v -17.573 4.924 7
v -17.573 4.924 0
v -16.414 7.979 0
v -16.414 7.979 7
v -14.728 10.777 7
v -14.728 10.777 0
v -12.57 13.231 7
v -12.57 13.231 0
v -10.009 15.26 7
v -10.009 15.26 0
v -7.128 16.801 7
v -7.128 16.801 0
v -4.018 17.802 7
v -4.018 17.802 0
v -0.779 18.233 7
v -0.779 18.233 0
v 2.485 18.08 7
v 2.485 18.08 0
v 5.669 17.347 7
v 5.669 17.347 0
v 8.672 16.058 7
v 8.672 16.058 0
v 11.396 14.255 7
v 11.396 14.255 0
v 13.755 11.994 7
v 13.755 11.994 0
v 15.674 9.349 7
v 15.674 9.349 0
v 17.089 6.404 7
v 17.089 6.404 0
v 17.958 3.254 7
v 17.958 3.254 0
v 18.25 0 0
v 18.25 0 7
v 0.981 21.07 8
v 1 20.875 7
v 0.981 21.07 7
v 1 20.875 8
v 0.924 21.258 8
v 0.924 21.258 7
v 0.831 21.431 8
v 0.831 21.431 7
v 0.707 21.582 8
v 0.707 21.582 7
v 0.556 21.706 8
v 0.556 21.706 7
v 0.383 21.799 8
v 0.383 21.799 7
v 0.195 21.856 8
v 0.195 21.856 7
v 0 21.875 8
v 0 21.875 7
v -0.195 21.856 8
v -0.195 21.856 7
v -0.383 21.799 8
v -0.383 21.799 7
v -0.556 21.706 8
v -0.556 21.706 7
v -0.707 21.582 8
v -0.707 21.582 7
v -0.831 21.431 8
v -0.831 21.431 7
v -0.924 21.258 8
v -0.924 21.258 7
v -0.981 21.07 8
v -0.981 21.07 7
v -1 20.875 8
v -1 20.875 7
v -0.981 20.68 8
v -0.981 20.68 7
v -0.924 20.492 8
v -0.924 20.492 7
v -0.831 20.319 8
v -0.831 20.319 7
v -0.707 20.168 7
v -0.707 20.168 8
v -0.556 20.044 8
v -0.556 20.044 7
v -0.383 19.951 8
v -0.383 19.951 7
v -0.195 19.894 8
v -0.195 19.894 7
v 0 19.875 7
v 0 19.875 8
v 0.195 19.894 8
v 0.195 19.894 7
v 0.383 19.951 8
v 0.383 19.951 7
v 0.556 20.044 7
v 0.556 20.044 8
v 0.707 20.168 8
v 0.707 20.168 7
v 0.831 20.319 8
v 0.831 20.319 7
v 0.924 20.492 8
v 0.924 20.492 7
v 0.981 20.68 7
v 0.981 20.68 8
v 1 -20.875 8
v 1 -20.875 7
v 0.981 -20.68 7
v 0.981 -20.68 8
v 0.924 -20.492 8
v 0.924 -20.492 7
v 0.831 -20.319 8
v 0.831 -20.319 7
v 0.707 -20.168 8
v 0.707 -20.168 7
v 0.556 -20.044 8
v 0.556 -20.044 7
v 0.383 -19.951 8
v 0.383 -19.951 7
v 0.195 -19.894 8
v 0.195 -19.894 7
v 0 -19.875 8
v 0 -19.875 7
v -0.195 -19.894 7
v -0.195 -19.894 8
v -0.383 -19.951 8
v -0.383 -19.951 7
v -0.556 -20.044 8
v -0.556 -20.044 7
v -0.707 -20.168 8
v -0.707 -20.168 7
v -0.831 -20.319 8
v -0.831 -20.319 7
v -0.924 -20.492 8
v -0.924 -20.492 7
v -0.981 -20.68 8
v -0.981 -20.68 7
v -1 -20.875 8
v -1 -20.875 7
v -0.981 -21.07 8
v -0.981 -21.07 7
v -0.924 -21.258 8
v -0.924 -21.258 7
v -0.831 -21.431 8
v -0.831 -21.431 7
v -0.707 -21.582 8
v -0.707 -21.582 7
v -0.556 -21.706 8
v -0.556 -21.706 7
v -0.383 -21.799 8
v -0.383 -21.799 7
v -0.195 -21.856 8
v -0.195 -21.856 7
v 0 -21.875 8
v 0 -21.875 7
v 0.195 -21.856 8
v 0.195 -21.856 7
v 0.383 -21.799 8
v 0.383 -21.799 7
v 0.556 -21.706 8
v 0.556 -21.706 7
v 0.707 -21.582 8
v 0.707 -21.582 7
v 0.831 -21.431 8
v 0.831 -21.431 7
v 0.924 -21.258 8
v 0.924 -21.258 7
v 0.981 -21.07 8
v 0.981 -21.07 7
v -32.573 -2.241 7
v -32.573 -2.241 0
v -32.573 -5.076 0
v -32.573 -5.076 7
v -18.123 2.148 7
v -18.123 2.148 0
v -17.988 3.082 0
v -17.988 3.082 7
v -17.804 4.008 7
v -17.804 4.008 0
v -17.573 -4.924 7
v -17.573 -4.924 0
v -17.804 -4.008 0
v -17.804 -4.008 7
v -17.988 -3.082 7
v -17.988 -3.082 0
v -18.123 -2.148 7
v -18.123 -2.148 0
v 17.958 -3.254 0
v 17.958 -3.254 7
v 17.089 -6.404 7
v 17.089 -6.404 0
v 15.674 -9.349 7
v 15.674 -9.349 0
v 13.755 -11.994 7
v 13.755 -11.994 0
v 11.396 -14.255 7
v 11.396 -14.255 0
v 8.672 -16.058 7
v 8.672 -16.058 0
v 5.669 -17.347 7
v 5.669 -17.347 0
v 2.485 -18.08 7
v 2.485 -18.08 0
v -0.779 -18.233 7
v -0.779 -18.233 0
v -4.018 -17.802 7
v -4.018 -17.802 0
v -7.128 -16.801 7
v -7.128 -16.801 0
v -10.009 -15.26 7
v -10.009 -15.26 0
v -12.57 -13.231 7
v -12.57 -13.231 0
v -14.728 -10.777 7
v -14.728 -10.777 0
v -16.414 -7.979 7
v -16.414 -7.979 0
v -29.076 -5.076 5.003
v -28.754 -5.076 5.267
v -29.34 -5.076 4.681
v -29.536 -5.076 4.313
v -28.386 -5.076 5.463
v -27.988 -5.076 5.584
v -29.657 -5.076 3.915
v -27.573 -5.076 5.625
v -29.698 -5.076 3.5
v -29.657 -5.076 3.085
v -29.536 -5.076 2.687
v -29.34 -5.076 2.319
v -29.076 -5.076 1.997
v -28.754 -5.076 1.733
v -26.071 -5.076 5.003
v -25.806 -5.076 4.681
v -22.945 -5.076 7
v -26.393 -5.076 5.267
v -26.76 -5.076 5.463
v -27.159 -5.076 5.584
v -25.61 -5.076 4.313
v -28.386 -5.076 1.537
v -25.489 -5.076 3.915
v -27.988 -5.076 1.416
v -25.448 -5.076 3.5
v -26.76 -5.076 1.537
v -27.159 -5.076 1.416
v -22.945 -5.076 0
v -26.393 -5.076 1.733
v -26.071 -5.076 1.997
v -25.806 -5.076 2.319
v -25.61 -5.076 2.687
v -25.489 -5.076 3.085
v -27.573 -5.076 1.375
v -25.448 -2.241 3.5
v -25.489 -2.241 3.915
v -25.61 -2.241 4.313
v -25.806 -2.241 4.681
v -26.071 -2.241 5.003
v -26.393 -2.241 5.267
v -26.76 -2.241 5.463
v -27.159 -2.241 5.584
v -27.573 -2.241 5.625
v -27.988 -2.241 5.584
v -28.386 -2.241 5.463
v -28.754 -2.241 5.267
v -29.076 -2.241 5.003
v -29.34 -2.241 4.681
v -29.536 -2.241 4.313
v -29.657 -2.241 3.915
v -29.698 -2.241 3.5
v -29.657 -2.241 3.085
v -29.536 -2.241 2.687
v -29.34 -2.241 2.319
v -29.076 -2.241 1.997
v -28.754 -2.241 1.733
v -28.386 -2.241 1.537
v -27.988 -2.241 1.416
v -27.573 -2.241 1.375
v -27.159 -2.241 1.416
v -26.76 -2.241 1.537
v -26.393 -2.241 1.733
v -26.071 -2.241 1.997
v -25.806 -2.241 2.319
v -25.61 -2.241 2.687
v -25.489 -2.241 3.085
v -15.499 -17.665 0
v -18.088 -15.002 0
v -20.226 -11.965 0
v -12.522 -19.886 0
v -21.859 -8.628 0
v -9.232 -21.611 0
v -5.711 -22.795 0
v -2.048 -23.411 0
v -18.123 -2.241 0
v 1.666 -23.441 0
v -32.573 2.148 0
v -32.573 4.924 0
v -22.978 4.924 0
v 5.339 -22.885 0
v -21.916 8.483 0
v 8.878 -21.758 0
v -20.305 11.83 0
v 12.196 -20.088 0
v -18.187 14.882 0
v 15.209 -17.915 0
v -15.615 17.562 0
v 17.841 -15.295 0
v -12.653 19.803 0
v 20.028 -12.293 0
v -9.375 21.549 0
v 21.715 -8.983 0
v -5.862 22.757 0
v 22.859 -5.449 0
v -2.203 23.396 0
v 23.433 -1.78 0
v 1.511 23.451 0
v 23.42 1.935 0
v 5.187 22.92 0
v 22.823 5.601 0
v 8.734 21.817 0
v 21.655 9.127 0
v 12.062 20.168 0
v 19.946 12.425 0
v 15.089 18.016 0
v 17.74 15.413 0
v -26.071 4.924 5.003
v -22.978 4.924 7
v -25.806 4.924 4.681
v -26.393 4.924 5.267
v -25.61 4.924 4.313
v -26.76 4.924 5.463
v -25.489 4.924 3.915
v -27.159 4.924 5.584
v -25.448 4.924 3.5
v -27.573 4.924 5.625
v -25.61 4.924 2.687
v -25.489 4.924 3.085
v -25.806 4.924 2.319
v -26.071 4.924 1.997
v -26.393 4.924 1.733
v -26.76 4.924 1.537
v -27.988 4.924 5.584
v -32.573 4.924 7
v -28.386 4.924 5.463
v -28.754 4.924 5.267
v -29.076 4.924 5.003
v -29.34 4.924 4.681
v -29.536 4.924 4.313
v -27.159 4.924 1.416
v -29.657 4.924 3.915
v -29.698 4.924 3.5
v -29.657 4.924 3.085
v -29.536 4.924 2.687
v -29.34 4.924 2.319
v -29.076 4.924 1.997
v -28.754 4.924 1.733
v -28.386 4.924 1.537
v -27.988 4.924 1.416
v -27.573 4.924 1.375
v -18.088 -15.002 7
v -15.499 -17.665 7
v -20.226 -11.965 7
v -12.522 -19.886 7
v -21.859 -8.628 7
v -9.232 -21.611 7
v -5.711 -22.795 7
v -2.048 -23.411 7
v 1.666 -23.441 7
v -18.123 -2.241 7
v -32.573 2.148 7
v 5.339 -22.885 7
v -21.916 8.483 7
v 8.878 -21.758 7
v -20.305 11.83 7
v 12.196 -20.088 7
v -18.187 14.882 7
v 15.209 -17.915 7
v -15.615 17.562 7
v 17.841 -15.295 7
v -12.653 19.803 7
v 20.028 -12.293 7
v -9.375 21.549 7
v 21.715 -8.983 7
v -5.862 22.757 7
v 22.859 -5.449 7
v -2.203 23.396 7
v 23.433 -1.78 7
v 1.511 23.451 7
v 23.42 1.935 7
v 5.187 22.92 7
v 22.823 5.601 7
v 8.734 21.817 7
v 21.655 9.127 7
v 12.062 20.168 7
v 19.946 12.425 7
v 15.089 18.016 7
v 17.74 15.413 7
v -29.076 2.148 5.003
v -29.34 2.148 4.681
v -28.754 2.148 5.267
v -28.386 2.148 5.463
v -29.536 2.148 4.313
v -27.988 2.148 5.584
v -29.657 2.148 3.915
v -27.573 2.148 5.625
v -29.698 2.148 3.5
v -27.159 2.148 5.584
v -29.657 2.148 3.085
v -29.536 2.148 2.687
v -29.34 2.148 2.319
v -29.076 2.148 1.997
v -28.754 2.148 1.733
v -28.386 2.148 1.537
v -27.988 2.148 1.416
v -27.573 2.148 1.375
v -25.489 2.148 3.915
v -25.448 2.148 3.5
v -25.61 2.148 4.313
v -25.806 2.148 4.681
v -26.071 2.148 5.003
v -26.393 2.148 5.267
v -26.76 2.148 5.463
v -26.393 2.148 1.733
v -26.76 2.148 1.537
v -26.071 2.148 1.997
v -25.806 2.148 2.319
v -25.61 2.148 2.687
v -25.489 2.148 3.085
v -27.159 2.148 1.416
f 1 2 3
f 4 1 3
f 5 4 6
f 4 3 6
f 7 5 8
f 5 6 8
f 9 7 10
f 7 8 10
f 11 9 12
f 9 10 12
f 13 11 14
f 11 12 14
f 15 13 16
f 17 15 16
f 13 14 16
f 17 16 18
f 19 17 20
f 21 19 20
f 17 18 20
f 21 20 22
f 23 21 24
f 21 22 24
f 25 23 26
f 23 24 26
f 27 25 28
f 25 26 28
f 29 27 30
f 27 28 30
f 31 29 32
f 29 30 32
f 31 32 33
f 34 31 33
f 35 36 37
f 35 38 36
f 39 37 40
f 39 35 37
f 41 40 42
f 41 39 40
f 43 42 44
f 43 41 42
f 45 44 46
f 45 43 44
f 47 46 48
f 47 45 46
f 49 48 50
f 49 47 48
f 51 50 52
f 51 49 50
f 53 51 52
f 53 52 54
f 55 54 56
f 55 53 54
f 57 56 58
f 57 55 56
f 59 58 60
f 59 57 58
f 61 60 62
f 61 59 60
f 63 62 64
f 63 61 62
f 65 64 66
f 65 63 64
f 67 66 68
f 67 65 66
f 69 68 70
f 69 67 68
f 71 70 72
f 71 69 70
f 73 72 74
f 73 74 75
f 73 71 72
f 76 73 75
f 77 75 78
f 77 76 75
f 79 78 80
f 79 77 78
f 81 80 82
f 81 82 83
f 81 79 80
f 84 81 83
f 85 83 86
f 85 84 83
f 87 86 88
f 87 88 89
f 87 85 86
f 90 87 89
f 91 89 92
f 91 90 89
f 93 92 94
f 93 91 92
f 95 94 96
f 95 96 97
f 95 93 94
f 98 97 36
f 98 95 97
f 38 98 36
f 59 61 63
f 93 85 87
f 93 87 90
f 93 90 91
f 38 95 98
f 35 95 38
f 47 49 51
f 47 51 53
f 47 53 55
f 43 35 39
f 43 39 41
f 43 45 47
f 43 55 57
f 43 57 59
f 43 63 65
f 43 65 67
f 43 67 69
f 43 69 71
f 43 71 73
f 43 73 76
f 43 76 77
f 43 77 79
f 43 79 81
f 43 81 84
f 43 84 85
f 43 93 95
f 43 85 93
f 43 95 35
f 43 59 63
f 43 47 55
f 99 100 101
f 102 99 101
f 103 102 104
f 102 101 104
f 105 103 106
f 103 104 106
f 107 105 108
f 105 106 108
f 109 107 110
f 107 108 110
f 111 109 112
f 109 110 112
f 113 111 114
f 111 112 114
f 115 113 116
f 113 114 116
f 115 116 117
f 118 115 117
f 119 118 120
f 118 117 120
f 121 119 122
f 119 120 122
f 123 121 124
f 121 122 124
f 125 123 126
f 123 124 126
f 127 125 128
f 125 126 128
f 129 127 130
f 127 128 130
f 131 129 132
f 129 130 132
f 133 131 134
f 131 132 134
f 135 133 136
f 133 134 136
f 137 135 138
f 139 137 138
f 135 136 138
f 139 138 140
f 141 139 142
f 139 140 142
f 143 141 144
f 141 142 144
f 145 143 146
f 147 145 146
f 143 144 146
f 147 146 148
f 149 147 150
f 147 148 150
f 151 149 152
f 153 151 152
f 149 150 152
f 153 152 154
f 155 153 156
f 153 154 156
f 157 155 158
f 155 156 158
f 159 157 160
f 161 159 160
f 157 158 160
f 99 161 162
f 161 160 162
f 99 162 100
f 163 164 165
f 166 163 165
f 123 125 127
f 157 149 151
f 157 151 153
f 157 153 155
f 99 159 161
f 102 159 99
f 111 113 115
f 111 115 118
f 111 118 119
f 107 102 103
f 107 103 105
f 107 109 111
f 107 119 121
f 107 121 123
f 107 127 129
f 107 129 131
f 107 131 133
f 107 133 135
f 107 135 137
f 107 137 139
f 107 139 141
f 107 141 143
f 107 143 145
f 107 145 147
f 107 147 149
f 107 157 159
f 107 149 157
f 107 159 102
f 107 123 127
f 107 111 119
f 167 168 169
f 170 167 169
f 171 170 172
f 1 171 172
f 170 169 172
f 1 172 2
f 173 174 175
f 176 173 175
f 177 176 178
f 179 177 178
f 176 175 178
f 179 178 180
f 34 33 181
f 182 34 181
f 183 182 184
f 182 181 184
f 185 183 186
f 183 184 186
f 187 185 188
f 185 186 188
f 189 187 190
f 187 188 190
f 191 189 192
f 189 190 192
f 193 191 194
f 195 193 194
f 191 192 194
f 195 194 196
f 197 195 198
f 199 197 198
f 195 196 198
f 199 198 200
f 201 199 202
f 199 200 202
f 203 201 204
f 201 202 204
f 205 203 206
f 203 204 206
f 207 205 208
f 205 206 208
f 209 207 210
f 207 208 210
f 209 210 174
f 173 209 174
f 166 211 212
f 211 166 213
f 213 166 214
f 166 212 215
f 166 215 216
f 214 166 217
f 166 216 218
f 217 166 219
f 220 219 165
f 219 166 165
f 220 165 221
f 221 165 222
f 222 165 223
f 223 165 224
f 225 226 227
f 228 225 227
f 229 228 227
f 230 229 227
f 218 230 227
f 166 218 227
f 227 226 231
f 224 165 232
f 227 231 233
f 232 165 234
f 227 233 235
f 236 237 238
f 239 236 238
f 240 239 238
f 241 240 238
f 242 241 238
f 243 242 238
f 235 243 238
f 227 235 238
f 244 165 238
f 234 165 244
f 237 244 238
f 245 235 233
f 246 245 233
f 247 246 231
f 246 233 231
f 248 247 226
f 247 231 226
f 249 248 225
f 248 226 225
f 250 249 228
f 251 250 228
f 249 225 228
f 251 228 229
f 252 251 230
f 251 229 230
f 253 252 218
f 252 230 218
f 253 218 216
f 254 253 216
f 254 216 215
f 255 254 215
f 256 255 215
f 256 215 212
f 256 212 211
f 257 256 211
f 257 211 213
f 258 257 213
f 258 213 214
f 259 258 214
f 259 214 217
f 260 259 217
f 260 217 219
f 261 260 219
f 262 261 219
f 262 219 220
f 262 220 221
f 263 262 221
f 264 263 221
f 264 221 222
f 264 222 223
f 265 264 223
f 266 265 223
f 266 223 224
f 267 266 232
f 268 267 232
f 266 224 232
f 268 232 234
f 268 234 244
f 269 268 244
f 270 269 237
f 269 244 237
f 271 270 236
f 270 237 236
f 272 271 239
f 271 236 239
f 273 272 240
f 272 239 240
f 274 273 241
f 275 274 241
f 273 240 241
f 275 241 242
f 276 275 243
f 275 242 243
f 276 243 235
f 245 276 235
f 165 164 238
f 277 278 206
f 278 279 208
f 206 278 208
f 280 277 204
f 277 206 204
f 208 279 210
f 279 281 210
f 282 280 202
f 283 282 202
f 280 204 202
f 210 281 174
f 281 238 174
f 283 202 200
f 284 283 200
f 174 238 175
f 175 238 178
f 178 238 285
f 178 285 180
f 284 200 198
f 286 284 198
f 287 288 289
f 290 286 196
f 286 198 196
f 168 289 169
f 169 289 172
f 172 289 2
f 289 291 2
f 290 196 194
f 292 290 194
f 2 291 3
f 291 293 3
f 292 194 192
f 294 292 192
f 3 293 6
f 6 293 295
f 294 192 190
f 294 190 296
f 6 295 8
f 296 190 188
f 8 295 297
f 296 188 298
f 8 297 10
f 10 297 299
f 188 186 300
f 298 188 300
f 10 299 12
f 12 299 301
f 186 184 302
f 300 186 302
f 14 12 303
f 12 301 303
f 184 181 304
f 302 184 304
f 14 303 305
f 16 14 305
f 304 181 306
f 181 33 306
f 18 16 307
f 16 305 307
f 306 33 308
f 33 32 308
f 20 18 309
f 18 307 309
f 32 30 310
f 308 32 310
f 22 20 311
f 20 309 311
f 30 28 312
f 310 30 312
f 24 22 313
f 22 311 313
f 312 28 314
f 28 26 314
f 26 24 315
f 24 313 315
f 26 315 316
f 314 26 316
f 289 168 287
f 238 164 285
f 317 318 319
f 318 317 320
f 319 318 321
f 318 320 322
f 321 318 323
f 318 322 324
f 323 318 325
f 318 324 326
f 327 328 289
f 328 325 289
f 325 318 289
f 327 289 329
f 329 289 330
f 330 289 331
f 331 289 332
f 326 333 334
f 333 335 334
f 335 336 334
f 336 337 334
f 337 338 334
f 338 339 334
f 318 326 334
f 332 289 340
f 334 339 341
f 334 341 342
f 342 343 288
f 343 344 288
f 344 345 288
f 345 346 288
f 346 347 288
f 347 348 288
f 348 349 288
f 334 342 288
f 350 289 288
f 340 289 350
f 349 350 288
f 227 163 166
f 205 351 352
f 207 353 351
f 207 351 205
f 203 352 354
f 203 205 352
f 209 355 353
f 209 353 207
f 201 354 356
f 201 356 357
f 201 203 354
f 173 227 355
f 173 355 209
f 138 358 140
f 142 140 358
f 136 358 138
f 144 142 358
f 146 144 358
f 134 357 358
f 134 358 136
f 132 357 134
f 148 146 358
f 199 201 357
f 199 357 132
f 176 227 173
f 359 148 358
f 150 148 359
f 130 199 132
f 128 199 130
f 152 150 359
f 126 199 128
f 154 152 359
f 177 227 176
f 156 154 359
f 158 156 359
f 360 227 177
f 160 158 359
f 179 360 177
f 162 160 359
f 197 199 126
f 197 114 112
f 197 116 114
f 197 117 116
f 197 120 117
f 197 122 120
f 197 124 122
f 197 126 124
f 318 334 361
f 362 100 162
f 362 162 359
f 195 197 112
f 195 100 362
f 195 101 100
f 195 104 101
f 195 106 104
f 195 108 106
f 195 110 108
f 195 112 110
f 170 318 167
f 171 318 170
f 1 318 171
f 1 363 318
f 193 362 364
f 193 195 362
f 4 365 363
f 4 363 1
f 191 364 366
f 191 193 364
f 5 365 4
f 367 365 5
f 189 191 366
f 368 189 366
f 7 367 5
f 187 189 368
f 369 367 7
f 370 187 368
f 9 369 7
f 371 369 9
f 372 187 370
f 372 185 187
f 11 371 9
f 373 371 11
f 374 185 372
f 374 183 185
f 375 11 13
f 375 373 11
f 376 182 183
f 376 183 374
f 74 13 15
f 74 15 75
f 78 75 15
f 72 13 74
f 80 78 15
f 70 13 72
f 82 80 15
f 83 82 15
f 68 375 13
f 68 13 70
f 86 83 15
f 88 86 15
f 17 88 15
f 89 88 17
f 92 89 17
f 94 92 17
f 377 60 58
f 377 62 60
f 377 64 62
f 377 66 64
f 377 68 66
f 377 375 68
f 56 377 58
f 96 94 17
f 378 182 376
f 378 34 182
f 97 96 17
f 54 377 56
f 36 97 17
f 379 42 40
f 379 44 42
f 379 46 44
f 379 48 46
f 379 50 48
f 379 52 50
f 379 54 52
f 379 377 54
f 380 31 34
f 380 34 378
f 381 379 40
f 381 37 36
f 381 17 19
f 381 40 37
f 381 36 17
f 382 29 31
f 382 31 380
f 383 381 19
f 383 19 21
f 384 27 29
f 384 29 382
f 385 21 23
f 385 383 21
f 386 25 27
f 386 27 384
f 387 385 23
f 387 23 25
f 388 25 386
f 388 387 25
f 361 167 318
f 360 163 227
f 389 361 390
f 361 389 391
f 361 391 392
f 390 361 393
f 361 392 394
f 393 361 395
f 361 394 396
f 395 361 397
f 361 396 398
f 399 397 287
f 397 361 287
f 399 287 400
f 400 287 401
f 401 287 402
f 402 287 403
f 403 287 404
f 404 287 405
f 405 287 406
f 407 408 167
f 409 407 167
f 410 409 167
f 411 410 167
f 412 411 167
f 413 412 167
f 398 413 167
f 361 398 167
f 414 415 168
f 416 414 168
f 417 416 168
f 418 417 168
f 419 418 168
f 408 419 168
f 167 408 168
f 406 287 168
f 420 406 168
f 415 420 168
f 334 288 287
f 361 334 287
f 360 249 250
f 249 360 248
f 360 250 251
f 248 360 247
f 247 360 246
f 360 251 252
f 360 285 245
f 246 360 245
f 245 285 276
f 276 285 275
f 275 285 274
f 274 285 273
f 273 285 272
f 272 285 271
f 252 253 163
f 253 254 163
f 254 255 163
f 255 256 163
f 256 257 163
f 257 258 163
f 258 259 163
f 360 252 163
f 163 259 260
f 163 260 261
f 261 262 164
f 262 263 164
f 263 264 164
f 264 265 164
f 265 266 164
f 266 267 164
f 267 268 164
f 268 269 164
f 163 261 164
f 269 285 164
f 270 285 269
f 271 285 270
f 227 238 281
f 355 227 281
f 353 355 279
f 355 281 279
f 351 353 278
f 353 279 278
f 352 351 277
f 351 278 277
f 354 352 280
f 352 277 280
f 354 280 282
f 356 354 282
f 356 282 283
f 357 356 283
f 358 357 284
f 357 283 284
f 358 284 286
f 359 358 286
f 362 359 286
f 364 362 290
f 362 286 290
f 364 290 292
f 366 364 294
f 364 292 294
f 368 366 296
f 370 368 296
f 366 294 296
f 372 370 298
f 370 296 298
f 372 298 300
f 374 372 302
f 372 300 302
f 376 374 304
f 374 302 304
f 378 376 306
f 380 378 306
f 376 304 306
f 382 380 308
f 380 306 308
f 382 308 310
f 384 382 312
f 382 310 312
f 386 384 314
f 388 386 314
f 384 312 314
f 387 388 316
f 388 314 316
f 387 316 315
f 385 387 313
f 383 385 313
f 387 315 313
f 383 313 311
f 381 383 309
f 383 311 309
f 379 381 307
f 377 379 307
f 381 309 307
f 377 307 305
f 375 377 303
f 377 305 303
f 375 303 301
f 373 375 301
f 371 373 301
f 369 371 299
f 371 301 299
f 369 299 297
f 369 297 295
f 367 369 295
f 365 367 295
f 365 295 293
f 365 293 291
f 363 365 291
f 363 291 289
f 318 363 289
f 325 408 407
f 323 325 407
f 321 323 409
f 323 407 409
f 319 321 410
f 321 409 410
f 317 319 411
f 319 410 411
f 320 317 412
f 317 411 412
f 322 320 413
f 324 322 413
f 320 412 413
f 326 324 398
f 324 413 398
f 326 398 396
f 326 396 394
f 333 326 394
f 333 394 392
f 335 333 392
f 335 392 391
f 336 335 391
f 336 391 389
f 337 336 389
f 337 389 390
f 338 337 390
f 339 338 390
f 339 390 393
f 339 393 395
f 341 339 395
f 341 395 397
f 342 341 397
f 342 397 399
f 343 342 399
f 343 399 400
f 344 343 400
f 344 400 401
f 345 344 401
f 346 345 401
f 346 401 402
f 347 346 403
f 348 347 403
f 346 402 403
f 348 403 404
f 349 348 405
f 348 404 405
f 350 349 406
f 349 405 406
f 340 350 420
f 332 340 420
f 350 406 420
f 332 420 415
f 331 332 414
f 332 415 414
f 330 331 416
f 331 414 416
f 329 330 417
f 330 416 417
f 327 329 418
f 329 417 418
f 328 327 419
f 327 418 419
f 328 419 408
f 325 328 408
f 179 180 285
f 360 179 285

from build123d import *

# Parameters (mm, degrees)
F1_DEPTH = 7
F2_R     = 2.125
F3_DEPTH = 10
F4_R     = 1
F5_DEPTH = 1


# Not quite as in the source:
# - a feature names something its author has since deleted; it is built from what else it names


with BuildPart() as f1:
    # F0 (on Top) → F1 (new body)
    with BuildSketch(Plane.XY):
        with BuildLine():
            ThreePointArc((-23.401635828, 2.1478921234), (-23.2315061267, 3.5421918479), (-22.9783775489, 4.9238364331))
            Line((-22.9783775489, 4.9238364331), (-32.5732277849, 4.9238364331))
            Line((-32.5732277849, 4.9238364331), (-32.5732277849, 2.1478921234))
            Line((-32.5732277849, 2.1478921234), (-23.401635828, 2.1478921234))
        make_face()
        with BuildLine():
            Line((-32.5732277849, -5.0761635669), (-22.9452078535, -5.0761635669))
            ThreePointArc((-22.9452078535, -5.0761635669), (-23.2124017724, -3.6652972535), (-23.3929275249, -2.2407458164))
            Line((-23.3929275249, -2.2407458164), (-32.5732277849, -2.2407458164))
            Line((-32.5732277849, -2.2407458164), (-32.5732277849, -5.0761635669))
        make_face()
        with BuildLine():
            ThreePointArc((-22.9452078535, -5.0761635669), (2.55319559, -23.3608902287), (23.5, 0))
            ThreePointArc((23.5, 0), (2.4756946097, 23.3692305436), (-22.9783775489, 4.9238364331))
            Line((-22.9783775489, 4.9238364331), (-17.5732277849, 4.9238364331))
            ThreePointArc((-17.5732277849, 4.9238364331), (2.4850646798, 18.080015308), (18.25, 0))
            ThreePointArc((18.25, 0), (2.4850646798, -18.080015308), (-17.5732277849, -4.9238364331))
            Line((-17.5732277849, -4.9238364331), (-17.5732277849, -5.0761635669))
            Line((-17.5732277849, -5.0761635669), (-22.9452078535, -5.0761635669))
        make_face()
        with BuildLine():
            Line((-17.5732277849, 4.9238364331), (-22.9783775489, 4.9238364331))
            ThreePointArc((-22.9783775489, 4.9238364331), (-23.2315061267, 3.5421918479), (-23.401635828, 2.1478921234))
            Line((-23.401635828, 2.1478921234), (-18.1231636153, 2.1478921234))
            ThreePointArc((-18.1231636153, 2.1478921234), (-17.9020824613, 3.5465396584), (-17.5732277849, 4.9238364331))
        make_face()
        with BuildLine():
            ThreePointArc((-23.3929275249, -2.2407458164), (-23.2124017724, -3.6652972535), (-22.9452078535, -5.0761635669))
            Line((-22.9452078535, -5.0761635669), (-17.5732277849, -5.0761635669))
            Line((-17.5732277849, -5.0761635669), (-17.5732277849, -4.9238364331))
            ThreePointArc((-17.5732277849, -4.9238364331), (-17.9020824613, -3.5465396584), (-18.1231636153, -2.1478921234))
            Line((-18.1231636153, -2.1478921234), (-18.1231636153, -2.2407458164))
            Line((-18.1231636153, -2.2407458164), (-23.3929275249, -2.2407458164))
        make_face()
    extrude(amount=F1_DEPTH)

    # F2 (on face) → F3 (cut)
    with BuildSketch(Plane.XZ.offset(5.0761635669)):
        with Locations((-27.5732277849, 3.5)):
            Circle(F2_R)
    extrude(amount=-F3_DEPTH, mode=Mode.SUBTRACT)

    # F4 (on face) → F5 (join, symmetric)
    with BuildSketch(Plane.XY.offset(7)):
        with Locations((0, -20.875)):
            Circle(F4_R)
        with Locations((0, 20.875)):
            Circle(F4_R)
    extrude(amount=F5_DEPTH, both=True)


solid = f1.part
